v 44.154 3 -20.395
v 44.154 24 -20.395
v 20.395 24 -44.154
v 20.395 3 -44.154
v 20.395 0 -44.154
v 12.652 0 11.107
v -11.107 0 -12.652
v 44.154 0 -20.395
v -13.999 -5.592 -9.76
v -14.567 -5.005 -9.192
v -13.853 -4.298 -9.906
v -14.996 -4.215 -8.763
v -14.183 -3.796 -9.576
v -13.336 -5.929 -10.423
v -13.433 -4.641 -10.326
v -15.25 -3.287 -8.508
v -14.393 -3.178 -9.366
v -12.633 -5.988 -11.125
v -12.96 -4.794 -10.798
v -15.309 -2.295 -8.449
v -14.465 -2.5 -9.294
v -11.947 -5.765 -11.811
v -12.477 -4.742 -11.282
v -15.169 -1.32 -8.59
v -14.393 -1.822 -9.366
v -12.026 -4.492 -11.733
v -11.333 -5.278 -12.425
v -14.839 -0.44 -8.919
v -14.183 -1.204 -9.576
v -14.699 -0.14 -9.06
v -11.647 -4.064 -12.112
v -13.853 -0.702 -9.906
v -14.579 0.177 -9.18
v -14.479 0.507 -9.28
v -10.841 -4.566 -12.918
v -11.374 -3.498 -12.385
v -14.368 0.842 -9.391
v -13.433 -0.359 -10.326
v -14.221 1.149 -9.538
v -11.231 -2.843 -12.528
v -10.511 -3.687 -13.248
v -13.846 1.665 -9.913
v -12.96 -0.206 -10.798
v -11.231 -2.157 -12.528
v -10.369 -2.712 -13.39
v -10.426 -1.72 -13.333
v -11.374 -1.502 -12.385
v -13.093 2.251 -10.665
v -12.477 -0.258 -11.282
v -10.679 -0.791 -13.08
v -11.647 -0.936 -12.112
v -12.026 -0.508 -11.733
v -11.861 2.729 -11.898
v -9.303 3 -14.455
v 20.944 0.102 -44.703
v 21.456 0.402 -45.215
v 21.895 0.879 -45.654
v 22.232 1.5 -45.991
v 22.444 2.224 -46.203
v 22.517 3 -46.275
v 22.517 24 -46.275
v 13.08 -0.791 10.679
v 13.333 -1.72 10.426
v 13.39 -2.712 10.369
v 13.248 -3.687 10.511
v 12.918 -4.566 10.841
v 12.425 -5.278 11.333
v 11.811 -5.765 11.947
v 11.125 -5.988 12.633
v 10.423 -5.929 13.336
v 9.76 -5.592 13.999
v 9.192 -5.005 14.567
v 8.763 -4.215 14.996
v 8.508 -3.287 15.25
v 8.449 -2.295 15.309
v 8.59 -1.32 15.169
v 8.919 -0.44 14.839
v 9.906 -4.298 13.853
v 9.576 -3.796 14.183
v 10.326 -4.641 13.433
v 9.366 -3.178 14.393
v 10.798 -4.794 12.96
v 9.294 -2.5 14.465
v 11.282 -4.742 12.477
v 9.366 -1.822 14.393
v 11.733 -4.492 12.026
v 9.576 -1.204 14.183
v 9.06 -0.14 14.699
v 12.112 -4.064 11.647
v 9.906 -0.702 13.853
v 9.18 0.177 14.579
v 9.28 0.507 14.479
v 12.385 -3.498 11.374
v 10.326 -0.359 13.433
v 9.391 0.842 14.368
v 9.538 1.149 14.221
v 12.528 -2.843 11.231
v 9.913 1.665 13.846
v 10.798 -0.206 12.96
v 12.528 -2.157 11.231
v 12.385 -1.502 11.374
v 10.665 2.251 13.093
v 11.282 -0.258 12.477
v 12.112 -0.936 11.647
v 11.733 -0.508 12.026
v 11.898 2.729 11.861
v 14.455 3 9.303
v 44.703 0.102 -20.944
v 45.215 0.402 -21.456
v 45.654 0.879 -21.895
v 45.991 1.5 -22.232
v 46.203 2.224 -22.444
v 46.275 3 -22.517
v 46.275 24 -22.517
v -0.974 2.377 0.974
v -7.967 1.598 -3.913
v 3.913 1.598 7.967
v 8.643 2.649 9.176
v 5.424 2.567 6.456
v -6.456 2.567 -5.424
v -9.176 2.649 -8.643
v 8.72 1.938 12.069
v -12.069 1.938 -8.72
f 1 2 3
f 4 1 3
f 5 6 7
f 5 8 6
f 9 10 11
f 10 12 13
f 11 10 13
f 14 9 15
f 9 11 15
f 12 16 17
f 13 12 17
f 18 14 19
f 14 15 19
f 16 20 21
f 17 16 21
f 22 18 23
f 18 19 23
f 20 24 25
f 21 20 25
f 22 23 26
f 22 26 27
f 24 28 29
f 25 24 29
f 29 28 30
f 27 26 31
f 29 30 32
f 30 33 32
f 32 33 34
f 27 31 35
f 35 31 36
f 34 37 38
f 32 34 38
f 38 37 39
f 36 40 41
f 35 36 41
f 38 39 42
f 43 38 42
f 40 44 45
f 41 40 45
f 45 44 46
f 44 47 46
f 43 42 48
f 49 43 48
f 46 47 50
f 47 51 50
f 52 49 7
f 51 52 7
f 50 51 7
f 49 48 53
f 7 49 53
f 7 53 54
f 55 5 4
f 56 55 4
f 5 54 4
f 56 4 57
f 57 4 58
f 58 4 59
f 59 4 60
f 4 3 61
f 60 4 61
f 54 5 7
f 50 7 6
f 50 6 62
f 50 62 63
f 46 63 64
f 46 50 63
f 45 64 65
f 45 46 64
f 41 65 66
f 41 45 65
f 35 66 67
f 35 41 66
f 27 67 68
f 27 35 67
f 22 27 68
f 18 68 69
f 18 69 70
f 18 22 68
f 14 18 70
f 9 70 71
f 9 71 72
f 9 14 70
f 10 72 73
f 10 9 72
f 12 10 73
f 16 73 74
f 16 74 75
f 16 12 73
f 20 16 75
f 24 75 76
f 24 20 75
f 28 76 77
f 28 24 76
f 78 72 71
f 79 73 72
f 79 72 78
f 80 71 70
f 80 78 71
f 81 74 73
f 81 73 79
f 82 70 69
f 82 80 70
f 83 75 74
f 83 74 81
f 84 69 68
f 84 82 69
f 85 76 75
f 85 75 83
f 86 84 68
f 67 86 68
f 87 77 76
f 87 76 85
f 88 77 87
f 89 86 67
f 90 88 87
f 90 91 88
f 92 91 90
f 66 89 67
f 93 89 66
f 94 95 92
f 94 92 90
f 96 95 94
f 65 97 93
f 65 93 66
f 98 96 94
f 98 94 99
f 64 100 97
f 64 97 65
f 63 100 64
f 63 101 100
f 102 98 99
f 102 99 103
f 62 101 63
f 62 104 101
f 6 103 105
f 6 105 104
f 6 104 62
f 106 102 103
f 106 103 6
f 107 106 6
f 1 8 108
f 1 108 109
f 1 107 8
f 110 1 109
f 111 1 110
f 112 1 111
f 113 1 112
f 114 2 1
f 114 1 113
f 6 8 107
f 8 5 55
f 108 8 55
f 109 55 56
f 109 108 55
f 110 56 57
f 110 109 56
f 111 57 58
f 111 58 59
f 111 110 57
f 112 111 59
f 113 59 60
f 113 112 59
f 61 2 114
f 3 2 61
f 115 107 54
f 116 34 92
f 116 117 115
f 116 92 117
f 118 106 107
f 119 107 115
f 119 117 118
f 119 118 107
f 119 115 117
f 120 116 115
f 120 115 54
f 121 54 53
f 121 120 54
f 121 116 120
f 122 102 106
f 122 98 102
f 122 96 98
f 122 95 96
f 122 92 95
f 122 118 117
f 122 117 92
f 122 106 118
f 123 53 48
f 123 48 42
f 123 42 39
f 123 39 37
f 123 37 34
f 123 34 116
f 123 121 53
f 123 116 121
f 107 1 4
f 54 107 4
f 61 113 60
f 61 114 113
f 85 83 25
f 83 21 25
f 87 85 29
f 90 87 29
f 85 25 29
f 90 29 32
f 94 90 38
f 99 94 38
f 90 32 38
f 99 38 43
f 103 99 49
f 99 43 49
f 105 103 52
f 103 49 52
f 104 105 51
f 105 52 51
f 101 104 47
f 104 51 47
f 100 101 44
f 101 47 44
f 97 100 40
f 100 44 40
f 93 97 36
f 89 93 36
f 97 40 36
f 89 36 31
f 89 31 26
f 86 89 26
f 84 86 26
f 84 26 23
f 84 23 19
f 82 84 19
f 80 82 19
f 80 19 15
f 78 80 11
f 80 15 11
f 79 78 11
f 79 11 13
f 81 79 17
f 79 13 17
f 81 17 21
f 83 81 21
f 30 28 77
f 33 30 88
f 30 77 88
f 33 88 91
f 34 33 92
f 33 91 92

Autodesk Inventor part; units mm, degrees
ref_plane "YZ Plane" through (0, 0, 0) normal (1, 0, 0) x (0, 1, 0)
ref_plane "XZ Plane" through (0, 0, 0) normal (0, 1, 0) x (-1, 0, 0)
ref_plane "XY Plane" through (0, 0, 0) normal (0, 0, 1) x (1, 0, 0)
sketch "Esquisse1" plane through (0, 0, 0) normal (0, 1, 0) x (-1, 0, 0)
  line L0 (35, 35) -> (35, 14)
  line L1 (35, 14) -> (42, 10)
  line L2 (42, 10) -> (42, 0)
  line L3 (35, 35) -> (0, 0)
  line L4 (42, 0) -> (0, 0) construction
  line L5 (35, -35) -> (35, -14)
  line L6 (35, -14) -> (42, -10)
  line L7 (42, -10) -> (42, 0)
  line L8 (35, -35) -> (0, 0)
  line L9 (38.5, -12) -> (38.5, 12) construction
  circle A0 centre (38.5, 0) radius 2.15
  circle A1 centre (38.5, 6) radius 2.15
  circle A2 centre (38.5, -6) radius 2.15
  dimension "d0" = 90
  dimension "d1" = 70
  dimension "d4" = 6
  dimension "d11" = 6
  dimension "d16" = 4.3
  dimension "d17" = 20
  dimension "d18" = 4
  dimension "d19" = 7
extrude "Extrusion1" add sketch "Esquisse1" along normal blind 3
pattern_circular "Réseau circulaire1" count 4 over 360 about axis through (0, 0, 0) along (0, 1, 0) of "Extrusion1"
ref_plane "Plan de construction2" through (0, 0, -14) normal (1, 0, 0) x (0, 0, -1)
ref_plane "Plan de construction3" through (-14, 0, 0) normal (0, 0, -1) x (-1, 0, 0)
chamfer "Chanfrein1" distance 10 angle 45 4 edges at (-35, 1.5, -35) (-35, 1.5, 35) (35, 1.5, -35) (35, 1.5, 35)
sketch "Esquisse3" plane through (0, 0, 0) normal (0, -1, 0) x (1, 0, 0)
  circle A0 centre (0, 38.5) radius 2.15 construction
  circle A1 centre (6, 38.5) radius 2.15 construction
  circle A2 centre (-6, 38.5) radius 2.15 construction
  circle A3 centre (38.5, 6) radius 2.15 construction
  circle A4 centre (38.5, -6) radius 2.15 construction
  circle A5 centre (38.5, 0) radius 2.15 construction
  circle A6 centre (6, -38.5) radius 2.15 construction
  circle A7 centre (-6, -38.5) radius 2.15 construction
  circle A8 centre (0, -38.5) radius 2.15 construction
  circle A9 centre (-38.5, -6) radius 2.15 construction
  circle A10 centre (-38.5, 6) radius 2.15 construction
  circle A11 centre (-38.5, 0) radius 2.15 construction
  line L0 (-35, 25) -> (-35, 14) construction
  line L1 (-35, 14) -> (-42, 10) construction
  line L2 (-42, 10) -> (-42, -10) construction
  line L3 (-42, -10) -> (-35, -14) construction
  line L4 (-35, -14) -> (-35, -25) construction
  line L5 (-25, -35) -> (-14, -35) construction
  line L6 (-14, -35) -> (-10, -42) construction
  line L7 (-10, -42) -> (10, -42) construction
  line L8 (10, -42) -> (14, -35) construction
  line L9 (14, -35) -> (25, -35) construction
  line L10 (35, -25) -> (35, -14) construction
  line L11 (35, -14) -> (42, -10) construction
  line L12 (42, -10) -> (42, 10) construction
  line L13 (42, 10) -> (35, 14) construction
  line L14 (35, 14) -> (35, 25) construction
  line L15 (25, 35) -> (14, 35) construction
  line L16 (14, 35) -> (10, 42) construction
  line L17 (10, 42) -> (-10, 42) construction
  line L18 (-10, 42) -> (-14, 35) construction
  line L19 (-14, 35) -> (-25, 35) construction
  line L20 (-51.72, -12.8291) -> (-12.8291, -51.72)
  line L21 (-12.8291, -51.72) -> (-10, -42)
  line L22 (-42, -10) -> (-51.72, -12.8291)
  line L23 (-35, -14) -> (-42, -10)
  line L24 (-42, -10) -> (-35, -14) projected
  line L25 (-10, -42) -> (-14, -35)
  line L26 (-14, -35) -> (-10, -42) projected
  line L27 (25, 35) -> (35, 25) projected
  line L28 (-35, 25) -> (-25, 35) projected
  line L29 (-25, -35) -> (-35, -25) projected
  line L30 (35, -25) -> (25, -35) projected
  line L31 (-14, -35) -> (-35, -14)
  point P0 (0, 0)
  dimension "d32" = 135
  dimension "d33" = 55
extrude "Extrusion3" add sketch "Esquisse3" against normal blind 3
sketch "Esquisse4" plane through (-51.72, 0, -12.8291) normal (-0.7071068, 0, -0.7071068) x (-0.7071068, 0, 0.7071068)
  line L0 (0, 0) -> (-55, 0) construction
  line L1 (0, 0) -> (0, 3) construction
  line L2 (-55, 3) -> (0, 3) construction
  line L3 (-55, 0) -> (-55, 3) construction
  line L4 (0, 0) -> (-55, 0)
  line L5 (-55, 0) -> (-55, 24)
  line L6 (-55, 24) -> (0, 24)
  line L7 (0, 24) -> (0, 0)
  point P0 (-27.5, 0)
  dimension "d36" = 24
extrude "Extrusion4" add sketch "Esquisse4" along normal blind 3
sketch "Esquisse5" plane through (-53.8413, 0, -14.9504) normal (-0.7071068, 0, -0.7071068) x (-0.7071068, 0, 0.7071068)
  line L0 (-55, 0) -> (0, 0) construction
  line L1 (0, 0) -> (0, 24) construction
  line L2 (0, 24) -> (-55, 24) construction
  line L3 (-55, 24) -> (-55, 0) construction
  line L4 (0, 0) -> (0, 24) construction
  line L5 (0, 9.2801) -> (-55, 9.2801) construction
  circle A0 centre (-15.1412, 9.2801) radius 7.3571
  line L6 (-27.5, 0) -> (-27.5, 24) construction
  circle A1 centre (-39.8588, 9.2801) radius 7.3571
extrude "Extrusion5" cut sketch "Esquisse5" against normal blind 1
pattern_circular "Réseau circulaire2" count 4 over 360 about axis through (0, 0, 0) along (0, -1, 0) of "Extrusion3", "Extrusion4"
fillet "Congé1" radius 3 2 edges at (-34.3959, 0, 34.3959) (34.3959, 0, -34.3959)
sketch "Esquisse6" plane through (0, 0, 0) normal (0, -1, 0) x (1, 0, 0)
  line L0 (51.72, -12.8291) -> (12.8291, -51.72) construction
  line L1 (51.72, -12.8291) -> (42, -10) construction
  line L2 (42, -10) -> (42, 10) construction
  line L3 (42, 10) -> (51.72, 12.8291) construction
  line L4 (51.72, 12.8291) -> (53.8413, 14.9504) construction
  line L5 (14.9504, 53.8413) -> (53.8413, 14.9504) construction
  line L6 (12.8291, 51.72) -> (14.9504, 53.8413) construction
  line L7 (12.8291, 51.72) -> (10, 42) construction
  line L8 (10, 42) -> (-10, 42) construction
  line L9 (-10, 42) -> (-12.8291, 51.72) construction
  line L10 (-51.72, 12.8291) -> (-12.8291, 51.72) construction
  line L11 (-51.72, 12.8291) -> (-42, 10) construction
  line L12 (-42, 10) -> (-42, -10) construction
  line L13 (-42, -10) -> (-51.72, -12.8291) construction
  line L14 (-51.72, -12.8291) -> (-53.8413, -14.9504) construction
  line L15 (-14.9504, -53.8413) -> (-53.8413, -14.9504) construction
  line L16 (-12.8291, -51.72) -> (-14.9504, -53.8413) construction
  line L17 (-12.8291, -51.72) -> (-10, -42) construction
  line L18 (-10, -42) -> (10, -42) construction
  line L19 (10, -42) -> (12.8291, -51.72) construction
  circle A0 centre (0, 38.5) radius 2.15 construction
  circle A1 centre (6, 38.5) radius 2.15 construction
  circle A2 centre (-6, 38.5) radius 2.15 construction
  circle A3 centre (38.5, 6) radius 2.15 construction
  circle A4 centre (38.5, -6) radius 2.15 construction
  circle A5 centre (38.5, 0) radius 2.15 construction
  circle A6 centre (6, -38.5) radius 2.15 construction
  circle A7 centre (-6, -38.5) radius 2.15 construction
  circle A8 centre (0, -38.5) radius 2.15 construction
  circle A9 centre (-38.5, -6) radius 2.15 construction
  circle A10 centre (-38.5, 6) radius 2.15 construction
  circle A11 centre (-38.5, 0) radius 2.15 construction
  line L20 (14.9504, -53.8413) -> (53.8413, -14.9504) construction
  line L21 (22.0215, -46.7702) -> (-16.8694, -7.8793)
  line L22 (-16.8694, -7.8793) -> (7.8793, 16.8694)
  line L23 (7.8793, 16.8694) -> (46.7702, -22.0215)
  line L24 (46.7702, -22.0215) -> (22.0215, -46.7702)
  line L25 (-16.8694, -7.8793) -> (-13.3339, -11.4149) construction
  line L26 (-13.3339, -11.4149) -> (11.4149, 13.3339) construction
  line L27 (11.4149, 13.3339) -> (7.8793, 16.8694) construction
  line L28 (-4.495, 4.495) -> (34.3959, -34.3959) construction
  line L29 (-13.3339, -11.4149) -> (-30.7818, -28.8628) construction
  circle A12 centre (-15.4552, -13.5362) radius 1.7
  circle A13 centre (-18.9907, -17.0717) radius 1.7
  circle A14 centre (13.5362, 15.4552) radius 1.7
  circle A15 centre (17.0717, 18.9907) radius 1.7
  point P0 (0, 0)
  dimension "d48" = 35
  dimension "d49" = 55
  dimension "d54" = 35
  dimension "d69" = 5
  dimension "d70" = 3
  dimension "d71" = 3.4
  dimension "d74" = 5
extrude "Extrusion6" cut sketch "Esquisse6" against normal through all contours L21 L22 L23 L24 keep common part
sketch "Esquisse7" plane through (19.9002, 3, -44.6489) normal (-0.7071068, 0, -0.7071068) x (-0.7071068, 0, 0.7071068)
  circle A0 centre (47, -5.5) radius 3.5
  line L0 (47, -3) -> (47, -5.5) construction
  line L1 (0, -3) -> (52, -3) construction
  point P0 (45.6431, -3)
  point P1 (47, -3)
  dimension "d97" = 2.5
  dimension "d98" = 7
extrude "Extrusion7" add sketch "Esquisse7" against normal blind 35
sketch "Esquisse8" plane through (19.9002, 3, -44.6489) normal (-0.7071068, 0, -0.7071068) x (-0.7071068, 0, 0.7071068)
  arc A0 (43.5, -3) -> (50.5, -3) centre (47, -3) ccw projected
  line L0 (49.4495, -3) -> (52, -3) projected
  line L1 (52, -3) -> (52, 0) projected
  line L2 (52, 0) -> (0, 0) projected
  line L3 (0, 0) -> (0, 21) projected
  line L4 (0, 21) -> (-3, 21) projected
  line L5 (-3, 21) -> (-3, 0) projected
  arc A1 (-3, 0) -> (0, -3) centre (0, 0) ccw projected
  line L6 (0, -3) -> (44.5505, -3) projected
  arc A2 (44.5505, -3) -> (49.4495, -3) centre (47, -5.5) ccw projected
  arc A3 (44.5505, -3) -> (49.4495, -3) centre (47, -5.5) ccw projected
  circle A4 centre (47, -5.5) radius 2.3
  point P0 (45.6431, -3)
  dimension "d99" = 4.6
extrude "Extrusion8" cut sketch "Esquisse8" against normal through all contours A4 A0 | A0 A4
sketch "Esquisse11" plane through (19.9002, 3, -44.6489) normal (-0.7071068, 0, -0.7071068) x (-0.7071068, 0, 0.7071068)
  line L0 (49.4495, -3) -> (52, -3) projected
  line L1 (52, -3) -> (52, 0) projected
  line L2 (52, 0) -> (0, 0) projected
  line L3 (0, 0) -> (0, 21) projected
  line L4 (0, 21) -> (-3, 21) projected
  line L5 (-3, 21) -> (-3, 0) projected
  arc A0 (-3, 0) -> (0, -3) centre (0, 0) ccw projected
  line L6 (0, -3) -> (44.5505, -3) projected
  arc A1 (44.5505, -3) -> (49.4495, -3) centre (47, -5.5) ccw projected
  line L7 (49.4495, -3) -> (49, 0) construction
  line L8 (52, 0) -> (0, 0) projected
  line L9 (49, 0) -> (42, 0) construction
  spline S0 degree 2 poles (49.4495, -3) (49, 0) (42, 0) knots 1 1 1 2 2 2
  point P0 (45.6431, -3)
  dimension "d100" = 3
  dimension "d101" = 10
extrude "Extrusion9" cut sketch "Esquisse11" against normal through all contours A1 L6 A0 L5 L4 L3 L2 S0 keep common part
fillet "Congé4" radius 4 1 edges at (-2.6915, 0, 2.6915)
sketch "Esquisse12" plane through (0, 0, 0) normal (0, -1, 0) x (1, 0, 0)
  line L0 (19.9002, -44.6489) -> (-11.6018, -13.1469) projected
  line L1 (44.6489, -19.9002) -> (19.9002, -44.6489) projected
  line L2 (13.1469, 11.6018) -> (44.6489, -19.9002) projected
  line L3 (22.0215, -46.7702) -> (46.7702, -22.0215) construction
  line L4 (34.3959, -34.3959) -> (-3.4344, 3.4344) construction
  line L5 (-15.8087, -8.94) -> (8.94, 15.8087) construction
  line L6 (-15.8087, -8.94) -> (8.94, 15.8087) projected
  line L7 (-15.3138, -8.445) -> (22.5165, -46.2752)
  line L8 (8.445, 15.3138) -> (46.2752, -22.5165)
  line L9 (22.5165, -46.2752) -> (22.0215, -46.7702)
  line L10 (22.0215, -46.7702) -> (-15.8087, -8.94)
  line L11 (-15.8087, -8.94) -> (-15.3138, -8.445)
  line L12 (46.2752, -22.5165) -> (46.7702, -22.0215)
  line L13 (46.7702, -22.0215) -> (8.94, 15.8087)
  line L14 (8.94, 15.8087) -> (8.445, 15.3138)
  line L15 (13.1469, 11.6018) -> (-11.6018, -13.1469) projected
  point P0 (-9.0912, -12.122)
  dimension "d91" = 0.7
extrude "Extrusion10" cut sketch "Esquisse12" along normal through all both and the other way through all contours L0 L15 L7 L1 | L1 L7 L9 L10 | L10 L6 L7 L15 | L8 L15 L2 L1 | L1 L13 L12 L8 | L8 L6 L13 L15
properties part number "clapet"
